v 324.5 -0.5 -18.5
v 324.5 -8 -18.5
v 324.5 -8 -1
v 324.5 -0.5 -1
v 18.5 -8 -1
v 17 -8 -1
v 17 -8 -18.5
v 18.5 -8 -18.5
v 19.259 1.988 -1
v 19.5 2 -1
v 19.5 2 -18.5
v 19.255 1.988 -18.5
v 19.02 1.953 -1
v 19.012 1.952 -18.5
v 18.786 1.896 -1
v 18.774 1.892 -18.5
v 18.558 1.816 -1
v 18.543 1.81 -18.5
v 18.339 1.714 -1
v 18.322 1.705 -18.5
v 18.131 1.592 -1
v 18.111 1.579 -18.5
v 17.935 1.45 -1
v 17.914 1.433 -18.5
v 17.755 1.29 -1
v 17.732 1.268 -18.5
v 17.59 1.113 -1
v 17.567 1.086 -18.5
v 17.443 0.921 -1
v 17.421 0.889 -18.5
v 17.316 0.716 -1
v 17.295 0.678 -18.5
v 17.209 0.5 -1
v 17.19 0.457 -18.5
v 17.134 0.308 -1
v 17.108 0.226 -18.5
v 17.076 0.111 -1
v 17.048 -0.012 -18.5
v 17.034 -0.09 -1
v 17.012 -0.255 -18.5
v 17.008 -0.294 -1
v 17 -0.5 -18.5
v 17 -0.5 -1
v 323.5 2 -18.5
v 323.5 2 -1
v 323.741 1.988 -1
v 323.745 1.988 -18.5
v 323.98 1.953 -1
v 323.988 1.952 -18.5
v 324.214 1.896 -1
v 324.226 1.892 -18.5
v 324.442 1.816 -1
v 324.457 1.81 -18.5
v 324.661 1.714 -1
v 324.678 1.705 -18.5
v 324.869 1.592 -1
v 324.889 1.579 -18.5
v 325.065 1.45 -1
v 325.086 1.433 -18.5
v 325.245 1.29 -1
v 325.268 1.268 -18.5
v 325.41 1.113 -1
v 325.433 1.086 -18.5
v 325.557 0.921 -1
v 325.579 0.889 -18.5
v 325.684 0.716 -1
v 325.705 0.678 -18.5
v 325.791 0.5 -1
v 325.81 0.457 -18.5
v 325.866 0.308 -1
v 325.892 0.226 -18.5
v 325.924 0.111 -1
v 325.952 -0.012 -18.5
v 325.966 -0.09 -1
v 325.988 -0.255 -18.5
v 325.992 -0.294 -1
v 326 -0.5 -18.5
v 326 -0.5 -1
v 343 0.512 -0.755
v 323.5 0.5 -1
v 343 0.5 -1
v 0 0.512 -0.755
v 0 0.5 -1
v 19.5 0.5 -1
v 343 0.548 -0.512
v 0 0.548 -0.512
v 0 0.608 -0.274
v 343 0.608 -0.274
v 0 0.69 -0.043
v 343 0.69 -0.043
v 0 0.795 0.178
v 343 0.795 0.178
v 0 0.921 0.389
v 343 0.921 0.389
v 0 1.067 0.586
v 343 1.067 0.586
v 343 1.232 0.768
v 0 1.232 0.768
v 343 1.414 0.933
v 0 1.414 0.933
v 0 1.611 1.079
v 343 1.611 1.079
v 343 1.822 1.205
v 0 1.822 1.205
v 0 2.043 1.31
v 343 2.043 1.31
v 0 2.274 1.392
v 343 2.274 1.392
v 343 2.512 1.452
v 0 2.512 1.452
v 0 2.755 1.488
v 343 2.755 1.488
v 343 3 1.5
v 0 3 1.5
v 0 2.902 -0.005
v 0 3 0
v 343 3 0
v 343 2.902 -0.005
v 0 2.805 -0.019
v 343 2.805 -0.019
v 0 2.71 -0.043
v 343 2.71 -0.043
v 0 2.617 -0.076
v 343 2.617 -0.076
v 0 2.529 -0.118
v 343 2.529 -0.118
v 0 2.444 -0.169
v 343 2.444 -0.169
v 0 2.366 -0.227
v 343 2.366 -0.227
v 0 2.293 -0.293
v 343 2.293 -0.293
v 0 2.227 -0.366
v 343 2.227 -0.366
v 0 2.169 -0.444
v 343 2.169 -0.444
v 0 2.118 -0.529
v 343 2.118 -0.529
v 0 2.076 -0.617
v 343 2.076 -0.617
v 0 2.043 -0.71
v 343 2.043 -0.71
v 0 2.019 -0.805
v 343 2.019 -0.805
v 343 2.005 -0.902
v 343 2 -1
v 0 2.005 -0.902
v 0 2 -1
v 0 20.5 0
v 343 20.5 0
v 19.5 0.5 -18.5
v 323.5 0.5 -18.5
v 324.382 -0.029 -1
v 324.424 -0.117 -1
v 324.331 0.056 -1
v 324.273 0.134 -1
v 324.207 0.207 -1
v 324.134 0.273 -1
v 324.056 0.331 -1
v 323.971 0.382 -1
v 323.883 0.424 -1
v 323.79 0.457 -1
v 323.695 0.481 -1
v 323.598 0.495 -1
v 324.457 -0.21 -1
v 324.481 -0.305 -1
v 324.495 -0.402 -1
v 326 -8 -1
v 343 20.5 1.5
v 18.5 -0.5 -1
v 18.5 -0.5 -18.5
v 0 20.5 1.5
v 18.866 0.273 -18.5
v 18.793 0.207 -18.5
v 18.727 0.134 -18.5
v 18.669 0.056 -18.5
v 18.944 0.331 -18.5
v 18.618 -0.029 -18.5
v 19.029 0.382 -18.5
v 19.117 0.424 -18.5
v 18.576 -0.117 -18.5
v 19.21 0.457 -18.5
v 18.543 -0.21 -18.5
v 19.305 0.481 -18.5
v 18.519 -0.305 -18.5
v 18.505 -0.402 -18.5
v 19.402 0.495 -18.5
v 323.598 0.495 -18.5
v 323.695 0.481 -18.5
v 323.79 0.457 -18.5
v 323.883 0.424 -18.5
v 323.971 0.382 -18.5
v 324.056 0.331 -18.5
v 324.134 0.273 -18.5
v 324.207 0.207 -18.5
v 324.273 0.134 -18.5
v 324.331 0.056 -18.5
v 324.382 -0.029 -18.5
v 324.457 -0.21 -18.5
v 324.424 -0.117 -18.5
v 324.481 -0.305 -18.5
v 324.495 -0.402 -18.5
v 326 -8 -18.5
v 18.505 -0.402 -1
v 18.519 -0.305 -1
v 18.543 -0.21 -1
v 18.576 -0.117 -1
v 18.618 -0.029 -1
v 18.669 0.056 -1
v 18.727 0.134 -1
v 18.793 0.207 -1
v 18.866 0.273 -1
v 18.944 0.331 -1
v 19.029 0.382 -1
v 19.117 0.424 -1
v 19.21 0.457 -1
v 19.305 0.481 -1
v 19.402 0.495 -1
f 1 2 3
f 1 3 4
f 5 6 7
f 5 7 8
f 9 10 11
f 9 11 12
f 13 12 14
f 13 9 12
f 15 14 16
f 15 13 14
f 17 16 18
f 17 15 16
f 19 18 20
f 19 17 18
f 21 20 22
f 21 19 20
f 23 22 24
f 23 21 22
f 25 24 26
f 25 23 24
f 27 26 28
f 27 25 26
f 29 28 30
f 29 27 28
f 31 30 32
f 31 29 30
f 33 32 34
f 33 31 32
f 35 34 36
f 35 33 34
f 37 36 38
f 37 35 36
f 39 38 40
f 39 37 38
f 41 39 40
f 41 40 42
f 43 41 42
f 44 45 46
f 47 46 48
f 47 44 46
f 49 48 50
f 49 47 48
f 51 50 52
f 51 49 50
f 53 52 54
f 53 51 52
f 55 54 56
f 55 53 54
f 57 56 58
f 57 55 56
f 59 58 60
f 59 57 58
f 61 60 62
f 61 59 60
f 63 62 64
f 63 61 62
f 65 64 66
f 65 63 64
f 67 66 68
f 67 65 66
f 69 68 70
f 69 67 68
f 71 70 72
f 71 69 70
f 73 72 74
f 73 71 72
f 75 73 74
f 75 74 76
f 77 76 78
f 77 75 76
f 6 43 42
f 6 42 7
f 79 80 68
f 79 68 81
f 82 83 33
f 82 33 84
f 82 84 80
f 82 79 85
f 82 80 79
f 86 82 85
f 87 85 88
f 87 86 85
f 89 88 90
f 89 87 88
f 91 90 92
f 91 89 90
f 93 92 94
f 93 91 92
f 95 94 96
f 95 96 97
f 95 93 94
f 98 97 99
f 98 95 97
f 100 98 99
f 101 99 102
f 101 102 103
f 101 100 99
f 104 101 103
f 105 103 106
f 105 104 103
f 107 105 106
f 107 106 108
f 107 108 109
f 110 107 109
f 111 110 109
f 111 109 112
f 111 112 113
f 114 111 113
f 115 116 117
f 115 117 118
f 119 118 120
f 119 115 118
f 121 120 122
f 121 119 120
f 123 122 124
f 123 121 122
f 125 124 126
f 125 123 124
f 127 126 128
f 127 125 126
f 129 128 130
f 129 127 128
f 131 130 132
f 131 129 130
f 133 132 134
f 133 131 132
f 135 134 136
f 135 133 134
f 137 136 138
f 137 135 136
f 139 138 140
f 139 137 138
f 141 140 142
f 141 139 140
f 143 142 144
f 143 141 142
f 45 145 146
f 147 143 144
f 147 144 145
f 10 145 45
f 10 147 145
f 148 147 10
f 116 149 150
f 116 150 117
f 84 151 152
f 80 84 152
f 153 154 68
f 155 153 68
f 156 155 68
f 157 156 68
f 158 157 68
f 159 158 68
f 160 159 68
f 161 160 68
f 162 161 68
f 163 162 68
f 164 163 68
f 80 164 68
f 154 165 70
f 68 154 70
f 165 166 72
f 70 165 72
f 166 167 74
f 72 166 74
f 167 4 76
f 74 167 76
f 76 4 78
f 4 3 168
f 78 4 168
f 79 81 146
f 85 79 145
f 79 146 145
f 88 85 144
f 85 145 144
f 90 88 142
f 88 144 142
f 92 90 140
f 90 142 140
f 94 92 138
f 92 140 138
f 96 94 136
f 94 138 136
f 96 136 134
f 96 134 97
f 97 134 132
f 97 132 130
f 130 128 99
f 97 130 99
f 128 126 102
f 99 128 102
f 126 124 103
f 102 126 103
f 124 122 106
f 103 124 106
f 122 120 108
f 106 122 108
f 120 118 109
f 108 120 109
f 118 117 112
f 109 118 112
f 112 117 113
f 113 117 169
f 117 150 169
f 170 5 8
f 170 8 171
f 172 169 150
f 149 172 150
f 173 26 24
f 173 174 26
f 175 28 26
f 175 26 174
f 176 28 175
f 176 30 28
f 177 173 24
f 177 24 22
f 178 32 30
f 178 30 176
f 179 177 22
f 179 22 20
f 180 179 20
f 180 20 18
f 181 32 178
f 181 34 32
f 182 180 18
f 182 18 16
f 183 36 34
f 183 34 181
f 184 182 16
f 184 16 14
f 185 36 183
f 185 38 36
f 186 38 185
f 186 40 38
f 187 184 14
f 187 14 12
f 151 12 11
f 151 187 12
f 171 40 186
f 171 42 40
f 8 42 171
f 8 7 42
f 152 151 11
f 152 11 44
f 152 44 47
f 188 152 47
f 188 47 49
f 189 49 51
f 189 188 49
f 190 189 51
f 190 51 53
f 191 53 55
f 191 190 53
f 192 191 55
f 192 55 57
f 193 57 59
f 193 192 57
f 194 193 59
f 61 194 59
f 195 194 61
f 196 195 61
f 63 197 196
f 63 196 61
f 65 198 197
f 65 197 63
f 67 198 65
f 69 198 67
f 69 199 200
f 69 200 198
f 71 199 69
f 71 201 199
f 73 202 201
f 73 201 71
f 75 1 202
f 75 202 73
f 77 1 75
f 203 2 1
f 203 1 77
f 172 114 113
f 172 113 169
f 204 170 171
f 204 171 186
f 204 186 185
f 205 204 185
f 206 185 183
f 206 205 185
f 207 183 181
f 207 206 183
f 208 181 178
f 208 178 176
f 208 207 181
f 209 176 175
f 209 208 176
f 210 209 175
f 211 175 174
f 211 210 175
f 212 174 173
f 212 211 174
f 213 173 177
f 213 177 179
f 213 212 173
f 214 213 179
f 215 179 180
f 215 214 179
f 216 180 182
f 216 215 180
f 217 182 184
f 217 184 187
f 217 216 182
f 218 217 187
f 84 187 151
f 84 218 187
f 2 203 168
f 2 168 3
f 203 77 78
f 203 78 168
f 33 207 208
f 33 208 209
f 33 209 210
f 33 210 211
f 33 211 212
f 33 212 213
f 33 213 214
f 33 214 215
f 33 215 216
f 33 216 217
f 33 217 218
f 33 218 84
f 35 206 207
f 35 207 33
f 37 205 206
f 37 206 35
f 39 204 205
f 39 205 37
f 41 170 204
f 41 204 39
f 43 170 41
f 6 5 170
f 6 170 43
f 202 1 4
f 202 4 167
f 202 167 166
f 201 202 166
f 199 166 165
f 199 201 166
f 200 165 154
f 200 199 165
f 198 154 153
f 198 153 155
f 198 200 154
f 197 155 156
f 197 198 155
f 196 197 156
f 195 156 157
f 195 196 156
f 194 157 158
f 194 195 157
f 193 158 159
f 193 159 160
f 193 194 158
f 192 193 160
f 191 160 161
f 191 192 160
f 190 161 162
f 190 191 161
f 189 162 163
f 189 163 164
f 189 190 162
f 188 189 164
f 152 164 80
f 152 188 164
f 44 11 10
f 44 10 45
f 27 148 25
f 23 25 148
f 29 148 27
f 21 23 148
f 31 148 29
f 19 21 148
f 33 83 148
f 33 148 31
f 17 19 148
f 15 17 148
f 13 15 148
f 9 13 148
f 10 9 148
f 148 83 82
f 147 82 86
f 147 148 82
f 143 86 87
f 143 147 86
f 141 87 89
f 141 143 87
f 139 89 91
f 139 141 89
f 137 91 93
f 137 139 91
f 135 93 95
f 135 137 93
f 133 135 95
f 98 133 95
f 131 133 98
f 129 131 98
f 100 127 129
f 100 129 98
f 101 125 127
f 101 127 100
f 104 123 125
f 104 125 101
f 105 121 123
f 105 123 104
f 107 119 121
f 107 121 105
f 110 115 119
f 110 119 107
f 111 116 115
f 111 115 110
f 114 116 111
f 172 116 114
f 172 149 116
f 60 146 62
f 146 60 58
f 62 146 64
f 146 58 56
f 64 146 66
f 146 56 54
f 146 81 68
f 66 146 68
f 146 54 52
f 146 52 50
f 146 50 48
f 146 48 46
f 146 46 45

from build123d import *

# Parameters (mm, degrees)
SKETCH_1_W                       = 343
SKETCH_1_H                       = 18.5
EXTRUDE_1_DEPTH                  = 2
SHEET_METAL_1_OUTLINE_W          = 343
SHEET_METAL_1_OUTLINE_H          = 18.5
SHEET_METAL_1_DEPTH              = 0.5
SM_EDGE_FLANGE_1_STRIP_W         = 8
SM_EDGE_FLANGE_1_STRIP_H         = 1.5
SM_EDGE_FLANGE_1_STRIP_CUT_DEPTH = 343
SM_EDGE_FLANGE_1_DEPTH           = 343
SM_EDGE_FLANGE_2_STRIP_W         = 26.5
SM_EDGE_FLANGE_2_STRIP_H         = 1.5
SM_EDGE_FLANGE_2_STRIP_CUT_DEPTH = 17.5
SM_EDGE_FLANGE_2_DEPTH           = 17.5
SM_EDGE_FLANGE_3_STRIP_W         = 26.5
SM_EDGE_FLANGE_3_STRIP_H         = 1.5
SM_EDGE_FLANGE_3_STRIP_CUT_DEPTH = 17.5
SM_EDGE_FLANGE_3_DEPTH           = 17.5


# Read off the part's stored shape, not the designer's step: Преобразовать-Твердое тело1
# Sheet-metal steps are written as plain solids
with BuildPart() as part:
    # Sketch 1 → Бобышка-Вытянуть1 (new body)
    with BuildSketch(Plane(origin=(0, 0, 0), x_dir=(1, 0, 0), z_dir=(0, 1, 0))):
        with Locations((171.5, 9.25)):
            Rectangle(SKETCH_1_W, SKETCH_1_H)
    extrude(amount=EXTRUDE_1_DEPTH)

    # Sheet Metal 1 outline → Sheet Metal 1 (cut)
    with BuildSketch(Plane(origin=(0, 0, 0), x_dir=(1, 0, 0), z_dir=(0, 1, 0))):
        with Locations((171.5, 9.25)):
            Rectangle(SHEET_METAL_1_OUTLINE_W, SHEET_METAL_1_OUTLINE_H)
    extrude(amount=SHEET_METAL_1_DEPTH, mode=Mode.SUBTRACT)

    # Ребро-кромка1 strip (across the edge) → Ребро-кромка1 strip cut (cut)
    with BuildSketch(Plane(origin=(0, 2, 0), x_dir=(0, 0, -1), z_dir=(1, 0, 0))):
        with Locations((-3, -0.75)):
            Rectangle(SM_EDGE_FLANGE_1_STRIP_W, SM_EDGE_FLANGE_1_STRIP_H)
    extrude(amount=SM_EDGE_FLANGE_1_STRIP_CUT_DEPTH, mode=Mode.SUBTRACT)

    # Ребро-кромка1 section (across the edge) → Ребро-кромка1 (add)
    with BuildSketch(Plane(origin=(0, 2, 0), x_dir=(0, 0, -1), z_dir=(1, 0, 0))):
        with BuildLine():
            Line((-1.5, 1), (-1.5, 18.5))
            Line((-1.5, 18.5), (0, 18.5))
            Line((0, 18.5), (0, 1))
            ThreePointArc((0, 1), (0.292893219, 0.292893219), (1, 0))
            Line((1, 0), (1, -1.5))
            ThreePointArc((1, -1.5), (-0.767766953, -0.767766953), (-1.5, 1))
        make_face()
    extrude(amount=SM_EDGE_FLANGE_1_DEPTH)

    # Ребро-кромка2 strip (across the edge) → Ребро-кромка2 strip cut (cut)
    with BuildSketch(Plane(origin=(18.5, 0.5, -1), x_dir=(1, 0, 0), z_dir=(0, 0, -1))):
        with Locations((-12.25, -0.75)):
            Rectangle(SM_EDGE_FLANGE_2_STRIP_W, SM_EDGE_FLANGE_2_STRIP_H)
    extrude(amount=SM_EDGE_FLANGE_2_STRIP_CUT_DEPTH, mode=Mode.SUBTRACT)

    # Ребро-кромка2 section (across the edge) → Ребро-кромка2 (add)
    with BuildSketch(Plane(origin=(18.5, 0.5, -1), x_dir=(1, 0, 0), z_dir=(0, 0, -1))):
        with BuildLine():
            Line((-1.5, 1), (-1.5, 8.5))
            Line((-1.5, 8.5), (0, 8.5))
            Line((0, 8.5), (0, 1))
            ThreePointArc((0, 1), (0.292893219, 0.292893219), (1, 0))
            Line((1, 0), (1, -1.5))
            ThreePointArc((1, -1.5), (-0.767766953, -0.767766953), (-1.5, 1))
        make_face()
    extrude(amount=SM_EDGE_FLANGE_2_DEPTH)

    # Ребро-кромка3 strip (across the edge) → Ребро-кромка3 strip cut (cut)
    with BuildSketch(Plane(origin=(324.5, 0.5, -18.5), x_dir=(-1, 0, 0), z_dir=(0, 0, 1))):
        with Locations((-12.25, -0.75)):
            Rectangle(SM_EDGE_FLANGE_3_STRIP_W, SM_EDGE_FLANGE_3_STRIP_H)
    extrude(amount=SM_EDGE_FLANGE_3_STRIP_CUT_DEPTH, mode=Mode.SUBTRACT)

    # Ребро-кромка3 section (across the edge) → Ребро-кромка3 (add)
    with BuildSketch(Plane(origin=(324.5, 0.5, -18.5), x_dir=(-1, 0, 0), z_dir=(0, 0, 1))):
        with BuildLine():
            Line((-1.5, 1), (-1.5, 8.5))
            Line((-1.5, 8.5), (0, 8.5))
            Line((0, 8.5), (0, 1))
            ThreePointArc((0, 1), (0.292893219, 0.292893219), (1, 0))
            Line((1, 0), (1, -1.5))
            ThreePointArc((1, -1.5), (-0.767766953, -0.767766953), (-1.5, 1))
        make_face()
    extrude(amount=SM_EDGE_FLANGE_3_DEPTH)


solid = part.part
